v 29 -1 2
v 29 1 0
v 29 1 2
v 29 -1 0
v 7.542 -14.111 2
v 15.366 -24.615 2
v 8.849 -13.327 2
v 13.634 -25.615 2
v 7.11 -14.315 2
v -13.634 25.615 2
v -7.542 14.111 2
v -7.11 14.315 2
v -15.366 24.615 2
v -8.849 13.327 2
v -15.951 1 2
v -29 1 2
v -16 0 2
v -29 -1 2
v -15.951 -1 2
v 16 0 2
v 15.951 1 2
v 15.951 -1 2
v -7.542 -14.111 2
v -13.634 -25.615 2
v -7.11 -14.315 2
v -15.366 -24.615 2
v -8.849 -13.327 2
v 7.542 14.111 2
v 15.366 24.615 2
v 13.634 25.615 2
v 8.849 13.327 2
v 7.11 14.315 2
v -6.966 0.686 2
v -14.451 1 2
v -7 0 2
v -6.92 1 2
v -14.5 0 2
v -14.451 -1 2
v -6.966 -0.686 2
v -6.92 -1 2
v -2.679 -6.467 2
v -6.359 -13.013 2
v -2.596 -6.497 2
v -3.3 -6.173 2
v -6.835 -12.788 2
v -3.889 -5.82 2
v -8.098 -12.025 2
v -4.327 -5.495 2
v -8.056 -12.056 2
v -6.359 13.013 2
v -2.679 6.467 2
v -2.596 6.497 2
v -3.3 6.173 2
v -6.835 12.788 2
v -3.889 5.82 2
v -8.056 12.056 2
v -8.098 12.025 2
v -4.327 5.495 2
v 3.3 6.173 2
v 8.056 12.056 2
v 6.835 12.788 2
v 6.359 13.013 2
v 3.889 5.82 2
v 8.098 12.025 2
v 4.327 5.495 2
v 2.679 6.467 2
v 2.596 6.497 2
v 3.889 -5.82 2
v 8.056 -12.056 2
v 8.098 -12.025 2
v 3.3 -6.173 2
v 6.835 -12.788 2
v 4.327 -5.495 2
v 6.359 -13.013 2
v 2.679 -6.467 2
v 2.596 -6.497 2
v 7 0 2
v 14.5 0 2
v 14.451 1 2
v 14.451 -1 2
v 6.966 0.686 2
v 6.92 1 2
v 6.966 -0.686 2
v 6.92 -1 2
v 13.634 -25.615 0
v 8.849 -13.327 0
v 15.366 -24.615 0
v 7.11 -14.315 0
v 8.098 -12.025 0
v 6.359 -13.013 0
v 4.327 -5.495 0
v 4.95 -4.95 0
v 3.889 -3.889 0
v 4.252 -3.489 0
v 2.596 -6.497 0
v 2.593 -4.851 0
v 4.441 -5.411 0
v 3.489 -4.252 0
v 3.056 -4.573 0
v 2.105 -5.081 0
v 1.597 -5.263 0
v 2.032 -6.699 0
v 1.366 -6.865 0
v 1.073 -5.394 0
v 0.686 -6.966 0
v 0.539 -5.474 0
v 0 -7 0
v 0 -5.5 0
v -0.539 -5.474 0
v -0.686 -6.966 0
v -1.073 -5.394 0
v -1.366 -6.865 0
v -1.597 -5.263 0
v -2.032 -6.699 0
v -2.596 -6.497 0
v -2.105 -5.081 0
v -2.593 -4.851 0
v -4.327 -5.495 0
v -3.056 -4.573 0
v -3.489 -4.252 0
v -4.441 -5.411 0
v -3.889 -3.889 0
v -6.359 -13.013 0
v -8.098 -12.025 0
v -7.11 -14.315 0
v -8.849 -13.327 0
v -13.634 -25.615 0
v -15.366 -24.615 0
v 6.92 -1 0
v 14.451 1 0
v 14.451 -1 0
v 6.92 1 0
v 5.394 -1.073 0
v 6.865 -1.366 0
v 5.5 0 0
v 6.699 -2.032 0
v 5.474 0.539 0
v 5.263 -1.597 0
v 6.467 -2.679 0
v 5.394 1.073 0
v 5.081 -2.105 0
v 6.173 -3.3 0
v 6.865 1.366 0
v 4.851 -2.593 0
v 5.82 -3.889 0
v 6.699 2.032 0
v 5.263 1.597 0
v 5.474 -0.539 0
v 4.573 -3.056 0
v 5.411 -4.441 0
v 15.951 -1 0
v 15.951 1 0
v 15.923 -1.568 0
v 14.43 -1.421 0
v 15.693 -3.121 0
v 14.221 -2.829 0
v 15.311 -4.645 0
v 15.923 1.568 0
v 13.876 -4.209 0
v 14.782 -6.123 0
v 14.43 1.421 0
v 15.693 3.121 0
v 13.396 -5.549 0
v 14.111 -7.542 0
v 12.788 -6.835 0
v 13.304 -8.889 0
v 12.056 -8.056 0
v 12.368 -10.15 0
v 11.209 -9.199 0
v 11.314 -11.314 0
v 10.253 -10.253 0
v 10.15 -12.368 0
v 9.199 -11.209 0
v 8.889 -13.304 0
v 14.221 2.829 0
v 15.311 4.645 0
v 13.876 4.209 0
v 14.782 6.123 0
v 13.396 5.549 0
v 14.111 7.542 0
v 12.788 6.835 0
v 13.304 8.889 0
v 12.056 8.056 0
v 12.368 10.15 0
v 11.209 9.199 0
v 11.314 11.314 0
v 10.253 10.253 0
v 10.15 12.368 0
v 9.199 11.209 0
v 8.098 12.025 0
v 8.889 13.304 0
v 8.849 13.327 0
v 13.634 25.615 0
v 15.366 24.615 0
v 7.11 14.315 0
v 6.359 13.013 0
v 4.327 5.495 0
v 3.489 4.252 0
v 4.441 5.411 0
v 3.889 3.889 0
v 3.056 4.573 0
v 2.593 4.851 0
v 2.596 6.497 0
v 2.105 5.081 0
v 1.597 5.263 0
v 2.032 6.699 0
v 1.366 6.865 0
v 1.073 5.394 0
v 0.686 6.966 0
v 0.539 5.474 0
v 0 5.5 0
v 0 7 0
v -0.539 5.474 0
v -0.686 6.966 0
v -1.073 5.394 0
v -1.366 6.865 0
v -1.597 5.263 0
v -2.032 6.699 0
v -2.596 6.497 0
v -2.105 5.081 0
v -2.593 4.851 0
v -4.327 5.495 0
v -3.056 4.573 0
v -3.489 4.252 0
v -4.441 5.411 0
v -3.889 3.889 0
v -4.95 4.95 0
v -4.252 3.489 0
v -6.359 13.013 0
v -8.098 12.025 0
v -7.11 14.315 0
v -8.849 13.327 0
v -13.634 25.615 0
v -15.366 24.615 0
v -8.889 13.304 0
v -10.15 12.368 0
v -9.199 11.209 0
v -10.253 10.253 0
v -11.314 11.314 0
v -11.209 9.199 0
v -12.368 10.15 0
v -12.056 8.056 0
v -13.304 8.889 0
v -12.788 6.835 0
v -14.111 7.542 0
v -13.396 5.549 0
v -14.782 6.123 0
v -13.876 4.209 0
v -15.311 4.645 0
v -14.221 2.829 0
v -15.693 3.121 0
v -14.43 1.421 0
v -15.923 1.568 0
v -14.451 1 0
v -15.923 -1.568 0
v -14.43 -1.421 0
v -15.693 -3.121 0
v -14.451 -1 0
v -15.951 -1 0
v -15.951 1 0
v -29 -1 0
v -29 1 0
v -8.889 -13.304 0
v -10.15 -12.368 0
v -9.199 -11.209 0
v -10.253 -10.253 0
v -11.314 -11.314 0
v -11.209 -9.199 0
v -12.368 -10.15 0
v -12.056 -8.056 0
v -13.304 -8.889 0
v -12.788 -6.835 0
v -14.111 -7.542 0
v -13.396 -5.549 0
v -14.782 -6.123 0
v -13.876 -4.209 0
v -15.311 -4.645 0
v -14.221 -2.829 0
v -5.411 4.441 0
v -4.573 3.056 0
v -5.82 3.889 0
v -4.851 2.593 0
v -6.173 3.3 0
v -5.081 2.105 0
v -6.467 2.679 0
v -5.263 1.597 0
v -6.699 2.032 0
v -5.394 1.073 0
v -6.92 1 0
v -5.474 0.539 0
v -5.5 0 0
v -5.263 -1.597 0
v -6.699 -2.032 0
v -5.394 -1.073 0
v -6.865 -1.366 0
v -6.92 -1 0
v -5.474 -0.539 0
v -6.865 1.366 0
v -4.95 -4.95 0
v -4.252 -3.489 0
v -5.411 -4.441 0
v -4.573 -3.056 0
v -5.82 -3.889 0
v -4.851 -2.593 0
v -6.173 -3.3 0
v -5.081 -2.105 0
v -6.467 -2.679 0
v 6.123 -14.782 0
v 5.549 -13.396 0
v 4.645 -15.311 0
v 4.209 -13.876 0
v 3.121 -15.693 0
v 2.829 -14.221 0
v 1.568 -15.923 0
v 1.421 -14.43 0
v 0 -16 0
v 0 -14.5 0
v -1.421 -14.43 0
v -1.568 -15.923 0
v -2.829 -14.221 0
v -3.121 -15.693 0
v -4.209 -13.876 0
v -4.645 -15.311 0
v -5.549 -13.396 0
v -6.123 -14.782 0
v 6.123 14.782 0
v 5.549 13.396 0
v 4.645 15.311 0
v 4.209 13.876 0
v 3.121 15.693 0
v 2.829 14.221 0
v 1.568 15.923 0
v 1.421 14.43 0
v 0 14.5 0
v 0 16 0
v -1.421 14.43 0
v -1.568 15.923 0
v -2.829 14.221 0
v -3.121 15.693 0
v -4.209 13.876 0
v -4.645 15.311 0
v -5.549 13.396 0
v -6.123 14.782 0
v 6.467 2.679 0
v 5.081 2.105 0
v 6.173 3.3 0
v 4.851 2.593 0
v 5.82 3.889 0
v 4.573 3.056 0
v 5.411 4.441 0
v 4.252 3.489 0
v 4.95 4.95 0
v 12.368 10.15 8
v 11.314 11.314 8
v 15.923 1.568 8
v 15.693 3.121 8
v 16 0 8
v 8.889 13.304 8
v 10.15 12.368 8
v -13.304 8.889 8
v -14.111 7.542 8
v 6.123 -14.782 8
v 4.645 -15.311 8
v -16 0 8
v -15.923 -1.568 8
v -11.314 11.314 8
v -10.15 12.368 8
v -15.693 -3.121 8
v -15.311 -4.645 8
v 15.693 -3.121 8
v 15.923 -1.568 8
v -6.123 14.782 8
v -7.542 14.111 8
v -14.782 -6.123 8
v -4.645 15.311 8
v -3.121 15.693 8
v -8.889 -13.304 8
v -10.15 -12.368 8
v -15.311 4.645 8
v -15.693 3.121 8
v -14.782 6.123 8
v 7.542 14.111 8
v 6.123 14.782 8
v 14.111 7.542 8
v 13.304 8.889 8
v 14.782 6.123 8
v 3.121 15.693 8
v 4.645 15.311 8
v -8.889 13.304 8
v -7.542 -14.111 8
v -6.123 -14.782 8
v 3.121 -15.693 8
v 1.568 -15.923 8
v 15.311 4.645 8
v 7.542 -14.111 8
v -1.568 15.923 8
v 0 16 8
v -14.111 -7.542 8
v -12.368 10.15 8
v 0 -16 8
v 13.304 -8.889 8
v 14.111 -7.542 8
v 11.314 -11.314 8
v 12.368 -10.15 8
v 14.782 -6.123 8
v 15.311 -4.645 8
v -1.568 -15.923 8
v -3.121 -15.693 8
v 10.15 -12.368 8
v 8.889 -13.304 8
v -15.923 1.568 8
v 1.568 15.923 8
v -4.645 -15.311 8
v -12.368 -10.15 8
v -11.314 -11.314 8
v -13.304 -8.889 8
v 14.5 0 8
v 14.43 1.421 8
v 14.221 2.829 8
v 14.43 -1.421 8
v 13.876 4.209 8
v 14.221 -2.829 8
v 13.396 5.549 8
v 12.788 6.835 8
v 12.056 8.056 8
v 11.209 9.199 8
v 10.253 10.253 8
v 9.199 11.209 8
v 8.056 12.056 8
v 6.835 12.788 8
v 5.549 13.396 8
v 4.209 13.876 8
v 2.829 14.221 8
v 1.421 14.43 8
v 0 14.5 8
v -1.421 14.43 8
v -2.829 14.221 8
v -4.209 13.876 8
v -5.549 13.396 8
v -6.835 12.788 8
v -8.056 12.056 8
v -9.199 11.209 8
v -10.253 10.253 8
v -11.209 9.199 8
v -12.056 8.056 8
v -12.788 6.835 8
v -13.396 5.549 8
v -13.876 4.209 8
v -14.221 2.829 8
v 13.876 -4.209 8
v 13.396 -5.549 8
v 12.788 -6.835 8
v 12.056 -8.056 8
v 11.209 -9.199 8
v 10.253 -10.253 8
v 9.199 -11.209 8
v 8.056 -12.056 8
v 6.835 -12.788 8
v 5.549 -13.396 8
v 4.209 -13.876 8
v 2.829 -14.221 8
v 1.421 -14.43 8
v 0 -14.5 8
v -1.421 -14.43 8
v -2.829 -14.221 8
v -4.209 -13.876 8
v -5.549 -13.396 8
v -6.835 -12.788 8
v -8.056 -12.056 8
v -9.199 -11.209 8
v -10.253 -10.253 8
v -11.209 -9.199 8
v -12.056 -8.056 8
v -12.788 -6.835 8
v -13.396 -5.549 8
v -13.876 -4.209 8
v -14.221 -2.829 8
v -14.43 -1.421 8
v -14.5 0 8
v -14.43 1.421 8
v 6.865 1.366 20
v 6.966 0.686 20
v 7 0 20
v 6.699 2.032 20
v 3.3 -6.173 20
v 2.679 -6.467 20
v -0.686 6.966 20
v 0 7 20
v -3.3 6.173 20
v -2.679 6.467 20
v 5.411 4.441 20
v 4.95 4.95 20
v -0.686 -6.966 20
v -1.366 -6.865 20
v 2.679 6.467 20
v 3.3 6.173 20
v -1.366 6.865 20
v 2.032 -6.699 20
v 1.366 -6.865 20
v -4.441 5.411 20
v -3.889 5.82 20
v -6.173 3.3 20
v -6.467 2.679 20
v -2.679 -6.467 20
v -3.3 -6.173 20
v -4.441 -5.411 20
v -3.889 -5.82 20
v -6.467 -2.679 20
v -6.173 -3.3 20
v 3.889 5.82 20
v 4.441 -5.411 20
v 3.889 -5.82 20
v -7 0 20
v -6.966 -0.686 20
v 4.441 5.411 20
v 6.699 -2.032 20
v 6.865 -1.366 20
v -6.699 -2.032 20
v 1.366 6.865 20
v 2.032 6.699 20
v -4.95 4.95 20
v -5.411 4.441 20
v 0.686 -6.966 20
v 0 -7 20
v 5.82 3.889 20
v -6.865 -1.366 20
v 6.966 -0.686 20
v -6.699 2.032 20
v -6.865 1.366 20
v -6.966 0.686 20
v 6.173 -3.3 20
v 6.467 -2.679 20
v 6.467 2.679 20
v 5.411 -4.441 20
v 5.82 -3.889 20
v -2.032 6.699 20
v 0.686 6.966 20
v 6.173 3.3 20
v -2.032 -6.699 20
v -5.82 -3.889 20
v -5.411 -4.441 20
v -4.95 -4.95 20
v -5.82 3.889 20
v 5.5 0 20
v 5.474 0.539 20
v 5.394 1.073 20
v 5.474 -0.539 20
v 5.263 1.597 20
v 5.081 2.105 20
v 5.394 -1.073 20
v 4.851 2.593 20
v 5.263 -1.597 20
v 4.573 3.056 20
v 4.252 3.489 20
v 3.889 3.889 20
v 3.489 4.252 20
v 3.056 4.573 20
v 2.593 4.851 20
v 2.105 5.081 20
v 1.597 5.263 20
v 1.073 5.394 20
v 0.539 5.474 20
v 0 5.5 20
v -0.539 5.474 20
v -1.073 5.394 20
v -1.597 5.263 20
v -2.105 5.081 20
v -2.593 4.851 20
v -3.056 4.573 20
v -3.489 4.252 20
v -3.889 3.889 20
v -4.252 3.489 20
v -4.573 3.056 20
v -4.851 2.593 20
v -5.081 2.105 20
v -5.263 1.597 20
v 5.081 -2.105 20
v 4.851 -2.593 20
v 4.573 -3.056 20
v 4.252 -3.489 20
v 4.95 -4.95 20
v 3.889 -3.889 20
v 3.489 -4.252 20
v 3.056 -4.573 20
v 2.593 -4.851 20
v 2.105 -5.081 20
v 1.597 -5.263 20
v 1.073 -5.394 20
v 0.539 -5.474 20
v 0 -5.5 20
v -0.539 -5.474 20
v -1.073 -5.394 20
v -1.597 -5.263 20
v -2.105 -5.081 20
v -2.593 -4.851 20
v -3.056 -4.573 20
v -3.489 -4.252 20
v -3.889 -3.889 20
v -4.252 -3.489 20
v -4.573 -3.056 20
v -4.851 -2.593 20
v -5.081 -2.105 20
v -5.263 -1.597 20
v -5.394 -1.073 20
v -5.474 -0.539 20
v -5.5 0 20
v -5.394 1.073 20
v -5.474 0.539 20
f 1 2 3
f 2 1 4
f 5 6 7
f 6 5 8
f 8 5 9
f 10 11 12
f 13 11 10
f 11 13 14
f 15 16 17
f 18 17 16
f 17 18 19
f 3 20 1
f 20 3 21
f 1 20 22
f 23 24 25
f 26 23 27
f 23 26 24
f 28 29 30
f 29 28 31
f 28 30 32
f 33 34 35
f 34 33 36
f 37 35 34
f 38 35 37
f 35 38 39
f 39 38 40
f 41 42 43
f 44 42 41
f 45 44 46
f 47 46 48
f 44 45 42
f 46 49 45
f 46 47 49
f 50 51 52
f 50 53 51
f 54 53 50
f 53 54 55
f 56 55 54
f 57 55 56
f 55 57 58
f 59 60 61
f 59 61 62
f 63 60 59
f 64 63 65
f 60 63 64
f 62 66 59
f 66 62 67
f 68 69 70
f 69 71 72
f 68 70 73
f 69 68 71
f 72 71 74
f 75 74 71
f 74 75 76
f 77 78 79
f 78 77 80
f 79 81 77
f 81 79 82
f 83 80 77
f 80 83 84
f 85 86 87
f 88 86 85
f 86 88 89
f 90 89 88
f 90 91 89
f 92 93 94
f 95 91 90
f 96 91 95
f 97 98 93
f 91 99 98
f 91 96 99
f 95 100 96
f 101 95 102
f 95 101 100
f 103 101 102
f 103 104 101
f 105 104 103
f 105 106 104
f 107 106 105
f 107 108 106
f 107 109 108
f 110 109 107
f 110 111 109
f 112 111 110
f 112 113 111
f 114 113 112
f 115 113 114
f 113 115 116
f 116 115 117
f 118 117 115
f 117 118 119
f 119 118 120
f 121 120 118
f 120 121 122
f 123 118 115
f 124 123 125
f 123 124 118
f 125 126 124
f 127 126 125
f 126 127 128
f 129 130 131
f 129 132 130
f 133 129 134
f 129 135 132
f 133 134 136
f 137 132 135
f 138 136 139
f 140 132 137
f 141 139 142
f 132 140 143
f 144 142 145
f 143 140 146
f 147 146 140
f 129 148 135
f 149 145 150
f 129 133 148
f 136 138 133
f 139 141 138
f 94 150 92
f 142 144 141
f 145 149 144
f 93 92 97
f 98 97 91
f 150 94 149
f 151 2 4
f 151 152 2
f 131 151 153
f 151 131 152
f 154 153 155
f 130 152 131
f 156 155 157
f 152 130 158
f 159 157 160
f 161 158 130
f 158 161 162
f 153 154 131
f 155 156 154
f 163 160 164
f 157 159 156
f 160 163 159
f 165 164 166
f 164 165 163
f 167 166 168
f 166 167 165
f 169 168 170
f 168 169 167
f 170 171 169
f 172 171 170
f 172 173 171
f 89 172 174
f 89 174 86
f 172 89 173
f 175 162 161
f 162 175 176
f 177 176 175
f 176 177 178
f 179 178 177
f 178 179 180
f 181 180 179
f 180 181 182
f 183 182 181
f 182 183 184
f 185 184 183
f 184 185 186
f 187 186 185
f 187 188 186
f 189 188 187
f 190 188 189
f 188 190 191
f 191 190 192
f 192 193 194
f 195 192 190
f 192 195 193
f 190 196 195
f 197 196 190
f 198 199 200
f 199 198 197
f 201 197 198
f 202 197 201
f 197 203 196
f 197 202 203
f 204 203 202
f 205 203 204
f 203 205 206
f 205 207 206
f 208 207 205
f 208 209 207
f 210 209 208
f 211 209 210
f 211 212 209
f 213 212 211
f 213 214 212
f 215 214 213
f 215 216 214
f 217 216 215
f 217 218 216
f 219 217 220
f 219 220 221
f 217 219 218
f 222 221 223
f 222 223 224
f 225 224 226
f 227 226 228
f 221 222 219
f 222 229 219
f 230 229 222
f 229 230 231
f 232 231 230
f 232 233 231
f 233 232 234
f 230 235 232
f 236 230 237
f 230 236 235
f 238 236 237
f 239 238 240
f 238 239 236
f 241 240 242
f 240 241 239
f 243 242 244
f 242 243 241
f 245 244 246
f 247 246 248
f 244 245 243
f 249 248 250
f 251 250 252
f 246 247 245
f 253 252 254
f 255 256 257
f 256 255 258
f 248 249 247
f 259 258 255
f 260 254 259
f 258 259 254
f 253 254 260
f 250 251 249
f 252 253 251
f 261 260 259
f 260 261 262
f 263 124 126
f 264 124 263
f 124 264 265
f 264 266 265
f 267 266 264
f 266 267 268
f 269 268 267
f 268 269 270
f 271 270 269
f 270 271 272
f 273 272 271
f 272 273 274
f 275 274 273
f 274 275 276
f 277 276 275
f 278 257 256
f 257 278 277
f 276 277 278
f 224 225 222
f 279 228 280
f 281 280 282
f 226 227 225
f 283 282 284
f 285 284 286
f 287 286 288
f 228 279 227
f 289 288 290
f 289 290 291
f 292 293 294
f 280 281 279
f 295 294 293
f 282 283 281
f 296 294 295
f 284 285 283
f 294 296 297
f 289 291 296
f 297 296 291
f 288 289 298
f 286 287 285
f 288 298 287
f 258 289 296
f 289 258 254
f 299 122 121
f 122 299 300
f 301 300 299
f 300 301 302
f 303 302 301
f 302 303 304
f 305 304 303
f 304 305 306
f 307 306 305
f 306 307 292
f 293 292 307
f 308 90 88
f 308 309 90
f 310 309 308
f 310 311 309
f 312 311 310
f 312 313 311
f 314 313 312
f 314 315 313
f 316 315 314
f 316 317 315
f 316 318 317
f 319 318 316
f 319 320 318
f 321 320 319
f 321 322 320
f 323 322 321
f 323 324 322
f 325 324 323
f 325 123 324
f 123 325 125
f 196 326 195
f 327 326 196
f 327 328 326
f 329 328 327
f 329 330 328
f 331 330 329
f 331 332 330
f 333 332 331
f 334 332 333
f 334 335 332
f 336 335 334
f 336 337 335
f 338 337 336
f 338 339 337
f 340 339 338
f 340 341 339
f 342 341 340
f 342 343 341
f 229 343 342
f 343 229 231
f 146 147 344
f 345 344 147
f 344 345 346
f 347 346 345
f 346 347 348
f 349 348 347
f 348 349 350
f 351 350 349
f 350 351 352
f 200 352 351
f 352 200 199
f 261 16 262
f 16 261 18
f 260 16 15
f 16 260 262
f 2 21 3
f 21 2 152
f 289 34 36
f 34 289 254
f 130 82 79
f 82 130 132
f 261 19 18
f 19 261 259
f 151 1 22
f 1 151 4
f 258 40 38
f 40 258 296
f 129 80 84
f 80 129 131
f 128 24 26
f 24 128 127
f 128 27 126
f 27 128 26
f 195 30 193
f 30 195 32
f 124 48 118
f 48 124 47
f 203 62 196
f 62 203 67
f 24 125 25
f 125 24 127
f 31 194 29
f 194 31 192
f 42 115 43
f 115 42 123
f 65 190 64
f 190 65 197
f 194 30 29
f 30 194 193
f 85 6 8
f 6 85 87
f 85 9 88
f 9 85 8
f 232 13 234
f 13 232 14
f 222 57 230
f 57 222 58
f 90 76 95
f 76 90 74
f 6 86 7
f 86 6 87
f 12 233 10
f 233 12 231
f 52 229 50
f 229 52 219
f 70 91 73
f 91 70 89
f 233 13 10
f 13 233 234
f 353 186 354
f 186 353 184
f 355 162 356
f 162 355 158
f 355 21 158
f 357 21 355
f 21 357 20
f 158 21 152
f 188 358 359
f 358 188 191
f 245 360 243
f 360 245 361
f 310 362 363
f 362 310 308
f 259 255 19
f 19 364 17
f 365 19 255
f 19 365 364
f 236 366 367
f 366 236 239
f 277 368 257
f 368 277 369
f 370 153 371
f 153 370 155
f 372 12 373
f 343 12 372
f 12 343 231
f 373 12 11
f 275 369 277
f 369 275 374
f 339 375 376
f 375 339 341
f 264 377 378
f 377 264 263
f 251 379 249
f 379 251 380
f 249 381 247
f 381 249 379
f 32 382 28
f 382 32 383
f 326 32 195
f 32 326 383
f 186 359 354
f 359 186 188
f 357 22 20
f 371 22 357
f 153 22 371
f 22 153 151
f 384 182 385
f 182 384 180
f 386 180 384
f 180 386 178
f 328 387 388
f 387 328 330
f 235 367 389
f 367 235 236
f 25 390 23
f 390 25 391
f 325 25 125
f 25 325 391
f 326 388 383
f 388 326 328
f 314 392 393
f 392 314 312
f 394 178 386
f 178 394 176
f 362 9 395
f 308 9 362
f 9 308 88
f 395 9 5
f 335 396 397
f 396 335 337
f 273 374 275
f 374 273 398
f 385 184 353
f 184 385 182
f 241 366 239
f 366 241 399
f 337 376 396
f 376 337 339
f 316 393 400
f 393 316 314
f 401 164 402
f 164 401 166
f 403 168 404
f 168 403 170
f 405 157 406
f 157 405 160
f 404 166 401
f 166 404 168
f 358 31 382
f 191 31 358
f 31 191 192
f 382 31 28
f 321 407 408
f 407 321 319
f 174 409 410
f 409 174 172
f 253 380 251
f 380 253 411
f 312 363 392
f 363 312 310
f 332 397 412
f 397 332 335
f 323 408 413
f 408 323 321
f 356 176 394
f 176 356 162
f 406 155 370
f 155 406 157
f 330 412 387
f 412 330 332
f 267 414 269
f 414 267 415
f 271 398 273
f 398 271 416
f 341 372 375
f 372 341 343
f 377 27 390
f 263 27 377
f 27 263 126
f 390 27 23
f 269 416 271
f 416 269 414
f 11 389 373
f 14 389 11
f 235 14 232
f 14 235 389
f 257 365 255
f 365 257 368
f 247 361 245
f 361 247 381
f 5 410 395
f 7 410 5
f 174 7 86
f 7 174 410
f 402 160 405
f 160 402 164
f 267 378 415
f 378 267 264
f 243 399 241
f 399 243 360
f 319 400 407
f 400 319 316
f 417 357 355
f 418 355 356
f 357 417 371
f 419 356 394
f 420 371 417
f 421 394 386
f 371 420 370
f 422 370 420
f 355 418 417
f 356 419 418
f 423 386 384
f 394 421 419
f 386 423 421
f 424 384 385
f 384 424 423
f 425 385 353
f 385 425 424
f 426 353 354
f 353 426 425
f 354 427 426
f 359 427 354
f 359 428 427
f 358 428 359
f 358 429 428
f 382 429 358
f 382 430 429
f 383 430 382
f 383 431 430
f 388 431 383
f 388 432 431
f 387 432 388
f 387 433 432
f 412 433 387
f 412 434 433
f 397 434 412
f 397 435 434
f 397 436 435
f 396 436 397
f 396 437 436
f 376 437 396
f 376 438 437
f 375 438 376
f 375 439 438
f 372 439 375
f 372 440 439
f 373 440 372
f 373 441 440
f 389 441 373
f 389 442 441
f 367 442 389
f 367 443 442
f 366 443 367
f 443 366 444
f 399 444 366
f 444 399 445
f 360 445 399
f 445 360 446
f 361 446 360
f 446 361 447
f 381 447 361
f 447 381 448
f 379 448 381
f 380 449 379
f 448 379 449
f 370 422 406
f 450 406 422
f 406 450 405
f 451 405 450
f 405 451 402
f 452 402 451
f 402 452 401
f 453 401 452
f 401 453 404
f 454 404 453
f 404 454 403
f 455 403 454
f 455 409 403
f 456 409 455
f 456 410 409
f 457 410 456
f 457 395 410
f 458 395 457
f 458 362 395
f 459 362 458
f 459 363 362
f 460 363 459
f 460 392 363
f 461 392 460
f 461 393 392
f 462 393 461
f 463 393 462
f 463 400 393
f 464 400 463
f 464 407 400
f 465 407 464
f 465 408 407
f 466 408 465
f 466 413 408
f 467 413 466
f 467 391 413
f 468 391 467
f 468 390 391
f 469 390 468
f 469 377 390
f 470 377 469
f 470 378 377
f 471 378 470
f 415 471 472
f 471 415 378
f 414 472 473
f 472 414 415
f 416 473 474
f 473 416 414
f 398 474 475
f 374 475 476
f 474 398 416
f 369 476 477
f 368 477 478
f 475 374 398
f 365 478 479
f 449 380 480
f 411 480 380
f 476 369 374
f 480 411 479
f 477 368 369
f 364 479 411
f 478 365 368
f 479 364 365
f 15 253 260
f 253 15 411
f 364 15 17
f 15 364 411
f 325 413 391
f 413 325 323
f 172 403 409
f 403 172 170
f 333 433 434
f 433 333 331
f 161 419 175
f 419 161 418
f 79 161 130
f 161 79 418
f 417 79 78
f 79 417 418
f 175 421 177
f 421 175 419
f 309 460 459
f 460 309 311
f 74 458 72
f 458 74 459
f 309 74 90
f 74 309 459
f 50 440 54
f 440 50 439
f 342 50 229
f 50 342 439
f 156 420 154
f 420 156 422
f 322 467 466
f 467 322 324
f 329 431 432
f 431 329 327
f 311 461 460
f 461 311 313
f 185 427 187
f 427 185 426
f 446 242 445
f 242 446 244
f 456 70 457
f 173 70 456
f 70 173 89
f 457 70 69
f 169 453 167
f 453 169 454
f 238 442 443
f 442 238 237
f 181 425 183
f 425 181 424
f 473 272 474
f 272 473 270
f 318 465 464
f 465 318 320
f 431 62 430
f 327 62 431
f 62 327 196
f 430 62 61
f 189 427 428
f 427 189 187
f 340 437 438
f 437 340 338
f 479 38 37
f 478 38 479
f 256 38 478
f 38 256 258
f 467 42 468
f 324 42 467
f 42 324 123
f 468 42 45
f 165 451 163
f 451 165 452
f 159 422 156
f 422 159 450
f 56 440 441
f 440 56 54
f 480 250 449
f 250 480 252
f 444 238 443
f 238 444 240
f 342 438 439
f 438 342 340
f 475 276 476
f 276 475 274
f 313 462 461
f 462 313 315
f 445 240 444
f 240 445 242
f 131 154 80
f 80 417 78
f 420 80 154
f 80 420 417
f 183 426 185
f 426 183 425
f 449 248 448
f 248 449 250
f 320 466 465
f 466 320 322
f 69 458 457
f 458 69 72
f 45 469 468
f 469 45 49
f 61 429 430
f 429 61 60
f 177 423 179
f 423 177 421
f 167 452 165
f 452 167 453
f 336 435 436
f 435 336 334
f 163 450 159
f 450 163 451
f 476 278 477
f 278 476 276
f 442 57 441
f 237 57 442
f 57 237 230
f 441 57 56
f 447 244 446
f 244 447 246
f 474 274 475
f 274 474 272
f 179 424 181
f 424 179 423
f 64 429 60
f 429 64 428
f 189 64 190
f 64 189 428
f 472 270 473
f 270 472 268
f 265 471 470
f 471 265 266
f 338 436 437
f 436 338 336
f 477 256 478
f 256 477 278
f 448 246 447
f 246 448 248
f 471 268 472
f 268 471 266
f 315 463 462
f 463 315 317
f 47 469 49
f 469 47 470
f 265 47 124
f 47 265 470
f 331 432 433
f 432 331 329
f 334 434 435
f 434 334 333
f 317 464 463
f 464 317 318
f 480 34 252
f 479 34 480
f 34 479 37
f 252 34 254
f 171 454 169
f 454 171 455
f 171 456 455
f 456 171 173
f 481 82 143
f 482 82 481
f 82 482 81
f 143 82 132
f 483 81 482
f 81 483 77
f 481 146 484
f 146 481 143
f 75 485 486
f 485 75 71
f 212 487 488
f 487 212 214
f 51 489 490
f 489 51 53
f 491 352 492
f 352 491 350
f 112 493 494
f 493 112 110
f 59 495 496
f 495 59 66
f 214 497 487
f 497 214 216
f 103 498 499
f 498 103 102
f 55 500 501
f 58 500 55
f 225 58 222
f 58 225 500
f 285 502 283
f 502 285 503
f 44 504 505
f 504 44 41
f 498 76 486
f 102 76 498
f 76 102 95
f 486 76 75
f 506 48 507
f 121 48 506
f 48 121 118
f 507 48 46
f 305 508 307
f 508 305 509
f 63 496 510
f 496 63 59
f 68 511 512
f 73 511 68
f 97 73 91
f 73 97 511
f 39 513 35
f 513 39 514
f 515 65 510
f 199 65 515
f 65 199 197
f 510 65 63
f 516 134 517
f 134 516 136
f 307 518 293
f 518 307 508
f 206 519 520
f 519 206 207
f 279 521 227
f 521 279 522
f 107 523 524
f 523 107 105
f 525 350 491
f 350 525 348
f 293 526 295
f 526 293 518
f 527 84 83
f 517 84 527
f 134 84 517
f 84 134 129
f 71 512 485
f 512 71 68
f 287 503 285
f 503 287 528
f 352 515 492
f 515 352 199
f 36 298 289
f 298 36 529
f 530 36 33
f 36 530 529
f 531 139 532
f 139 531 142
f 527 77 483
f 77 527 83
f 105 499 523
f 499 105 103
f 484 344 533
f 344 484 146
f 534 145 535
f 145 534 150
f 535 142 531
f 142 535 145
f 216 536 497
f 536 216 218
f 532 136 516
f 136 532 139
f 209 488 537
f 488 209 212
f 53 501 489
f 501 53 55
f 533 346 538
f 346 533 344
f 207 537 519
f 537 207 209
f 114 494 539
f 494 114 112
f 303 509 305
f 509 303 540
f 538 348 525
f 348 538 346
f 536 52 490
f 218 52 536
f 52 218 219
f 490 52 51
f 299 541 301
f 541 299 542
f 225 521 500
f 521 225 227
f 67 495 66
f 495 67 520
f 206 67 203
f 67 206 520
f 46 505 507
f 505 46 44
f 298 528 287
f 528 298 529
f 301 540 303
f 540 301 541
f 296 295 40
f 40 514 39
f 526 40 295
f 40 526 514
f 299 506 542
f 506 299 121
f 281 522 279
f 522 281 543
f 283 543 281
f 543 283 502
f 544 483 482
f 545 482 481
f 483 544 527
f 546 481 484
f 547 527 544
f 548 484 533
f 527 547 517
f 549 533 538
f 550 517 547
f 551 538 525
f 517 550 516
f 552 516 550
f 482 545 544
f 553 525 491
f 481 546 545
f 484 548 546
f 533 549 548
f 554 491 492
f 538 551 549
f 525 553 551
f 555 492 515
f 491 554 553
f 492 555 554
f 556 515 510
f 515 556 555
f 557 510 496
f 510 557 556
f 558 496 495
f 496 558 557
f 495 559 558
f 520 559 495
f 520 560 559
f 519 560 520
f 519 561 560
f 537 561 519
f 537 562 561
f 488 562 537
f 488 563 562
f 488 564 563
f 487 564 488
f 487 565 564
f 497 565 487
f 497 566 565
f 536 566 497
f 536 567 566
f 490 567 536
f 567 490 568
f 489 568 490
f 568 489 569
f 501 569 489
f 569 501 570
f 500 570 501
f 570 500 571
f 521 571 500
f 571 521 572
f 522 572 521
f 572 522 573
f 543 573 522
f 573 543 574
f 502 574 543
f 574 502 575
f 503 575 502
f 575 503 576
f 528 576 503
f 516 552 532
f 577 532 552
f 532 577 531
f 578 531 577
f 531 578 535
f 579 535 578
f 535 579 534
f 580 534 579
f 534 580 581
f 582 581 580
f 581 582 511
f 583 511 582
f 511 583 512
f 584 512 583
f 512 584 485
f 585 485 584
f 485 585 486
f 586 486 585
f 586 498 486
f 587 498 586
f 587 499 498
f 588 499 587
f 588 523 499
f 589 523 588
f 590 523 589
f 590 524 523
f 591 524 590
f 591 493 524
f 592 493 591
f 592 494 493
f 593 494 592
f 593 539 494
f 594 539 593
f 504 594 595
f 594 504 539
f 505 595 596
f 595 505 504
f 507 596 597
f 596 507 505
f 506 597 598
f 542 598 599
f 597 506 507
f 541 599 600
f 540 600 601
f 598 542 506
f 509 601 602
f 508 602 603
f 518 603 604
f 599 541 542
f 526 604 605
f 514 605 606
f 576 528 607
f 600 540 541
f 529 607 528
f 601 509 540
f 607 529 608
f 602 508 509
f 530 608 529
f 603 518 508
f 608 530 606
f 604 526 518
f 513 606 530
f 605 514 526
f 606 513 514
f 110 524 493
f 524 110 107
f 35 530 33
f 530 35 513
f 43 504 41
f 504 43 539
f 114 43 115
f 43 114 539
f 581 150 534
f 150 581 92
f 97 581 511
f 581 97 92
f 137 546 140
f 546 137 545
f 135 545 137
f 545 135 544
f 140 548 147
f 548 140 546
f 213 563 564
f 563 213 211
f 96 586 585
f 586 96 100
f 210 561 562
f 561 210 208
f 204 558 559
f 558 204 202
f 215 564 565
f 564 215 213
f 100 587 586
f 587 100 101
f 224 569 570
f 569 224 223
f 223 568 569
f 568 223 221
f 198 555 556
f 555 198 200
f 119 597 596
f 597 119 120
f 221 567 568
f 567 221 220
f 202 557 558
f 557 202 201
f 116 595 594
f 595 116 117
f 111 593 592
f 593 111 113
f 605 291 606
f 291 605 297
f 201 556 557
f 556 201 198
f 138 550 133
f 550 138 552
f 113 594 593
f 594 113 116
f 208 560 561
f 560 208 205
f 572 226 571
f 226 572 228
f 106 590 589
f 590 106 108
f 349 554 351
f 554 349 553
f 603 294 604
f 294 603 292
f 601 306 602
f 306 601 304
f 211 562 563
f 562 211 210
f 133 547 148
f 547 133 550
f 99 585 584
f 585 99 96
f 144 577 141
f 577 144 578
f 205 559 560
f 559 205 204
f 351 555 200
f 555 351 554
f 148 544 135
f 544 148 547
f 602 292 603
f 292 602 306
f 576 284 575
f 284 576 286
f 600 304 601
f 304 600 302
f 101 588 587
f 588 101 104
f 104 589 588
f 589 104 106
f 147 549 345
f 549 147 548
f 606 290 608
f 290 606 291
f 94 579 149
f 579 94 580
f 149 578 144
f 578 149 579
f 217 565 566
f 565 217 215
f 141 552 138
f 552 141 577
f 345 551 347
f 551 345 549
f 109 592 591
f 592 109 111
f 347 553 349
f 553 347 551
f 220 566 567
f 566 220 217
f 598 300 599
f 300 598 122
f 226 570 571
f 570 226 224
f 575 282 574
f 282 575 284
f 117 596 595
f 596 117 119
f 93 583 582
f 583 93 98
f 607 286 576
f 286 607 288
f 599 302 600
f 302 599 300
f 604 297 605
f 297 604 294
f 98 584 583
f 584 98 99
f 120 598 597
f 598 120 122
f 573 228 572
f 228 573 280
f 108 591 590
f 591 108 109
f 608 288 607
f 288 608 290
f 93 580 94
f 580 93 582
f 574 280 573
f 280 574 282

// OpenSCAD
spindle_diameter = 14;
support_diameter = 32;
stand_diameter = 60;


module ring(r_outer, r_inner, height) {
  difference() {
    cylinder(h = height, r=r_outer, $fn=64);
    translate([0, 0, -1])
      cylinder(h = height+2, r=r_inner, $fn=64);
  }
}

module stand() {
  for (i=[0:2]) {
    rotate(60*i)
      translate([-(stand_diameter-2)/2, -1,0])
      cube(size=[stand_diameter-2,2,2]);
  }
}

module support() {
  ring(support_diameter/2, (support_diameter/2)-1.5, 8);
}
module spindle() {
  ring(spindle_diameter/2, (spindle_diameter/2)-1.5, 20);
}

difference() {
  union() {
    stand();
    support();
    spindle();
  }
  translate([0, 0, -1])
    cylinder(h = 2+2, r=(spindle_diameter/2)-1.5, $fn=64);
}
